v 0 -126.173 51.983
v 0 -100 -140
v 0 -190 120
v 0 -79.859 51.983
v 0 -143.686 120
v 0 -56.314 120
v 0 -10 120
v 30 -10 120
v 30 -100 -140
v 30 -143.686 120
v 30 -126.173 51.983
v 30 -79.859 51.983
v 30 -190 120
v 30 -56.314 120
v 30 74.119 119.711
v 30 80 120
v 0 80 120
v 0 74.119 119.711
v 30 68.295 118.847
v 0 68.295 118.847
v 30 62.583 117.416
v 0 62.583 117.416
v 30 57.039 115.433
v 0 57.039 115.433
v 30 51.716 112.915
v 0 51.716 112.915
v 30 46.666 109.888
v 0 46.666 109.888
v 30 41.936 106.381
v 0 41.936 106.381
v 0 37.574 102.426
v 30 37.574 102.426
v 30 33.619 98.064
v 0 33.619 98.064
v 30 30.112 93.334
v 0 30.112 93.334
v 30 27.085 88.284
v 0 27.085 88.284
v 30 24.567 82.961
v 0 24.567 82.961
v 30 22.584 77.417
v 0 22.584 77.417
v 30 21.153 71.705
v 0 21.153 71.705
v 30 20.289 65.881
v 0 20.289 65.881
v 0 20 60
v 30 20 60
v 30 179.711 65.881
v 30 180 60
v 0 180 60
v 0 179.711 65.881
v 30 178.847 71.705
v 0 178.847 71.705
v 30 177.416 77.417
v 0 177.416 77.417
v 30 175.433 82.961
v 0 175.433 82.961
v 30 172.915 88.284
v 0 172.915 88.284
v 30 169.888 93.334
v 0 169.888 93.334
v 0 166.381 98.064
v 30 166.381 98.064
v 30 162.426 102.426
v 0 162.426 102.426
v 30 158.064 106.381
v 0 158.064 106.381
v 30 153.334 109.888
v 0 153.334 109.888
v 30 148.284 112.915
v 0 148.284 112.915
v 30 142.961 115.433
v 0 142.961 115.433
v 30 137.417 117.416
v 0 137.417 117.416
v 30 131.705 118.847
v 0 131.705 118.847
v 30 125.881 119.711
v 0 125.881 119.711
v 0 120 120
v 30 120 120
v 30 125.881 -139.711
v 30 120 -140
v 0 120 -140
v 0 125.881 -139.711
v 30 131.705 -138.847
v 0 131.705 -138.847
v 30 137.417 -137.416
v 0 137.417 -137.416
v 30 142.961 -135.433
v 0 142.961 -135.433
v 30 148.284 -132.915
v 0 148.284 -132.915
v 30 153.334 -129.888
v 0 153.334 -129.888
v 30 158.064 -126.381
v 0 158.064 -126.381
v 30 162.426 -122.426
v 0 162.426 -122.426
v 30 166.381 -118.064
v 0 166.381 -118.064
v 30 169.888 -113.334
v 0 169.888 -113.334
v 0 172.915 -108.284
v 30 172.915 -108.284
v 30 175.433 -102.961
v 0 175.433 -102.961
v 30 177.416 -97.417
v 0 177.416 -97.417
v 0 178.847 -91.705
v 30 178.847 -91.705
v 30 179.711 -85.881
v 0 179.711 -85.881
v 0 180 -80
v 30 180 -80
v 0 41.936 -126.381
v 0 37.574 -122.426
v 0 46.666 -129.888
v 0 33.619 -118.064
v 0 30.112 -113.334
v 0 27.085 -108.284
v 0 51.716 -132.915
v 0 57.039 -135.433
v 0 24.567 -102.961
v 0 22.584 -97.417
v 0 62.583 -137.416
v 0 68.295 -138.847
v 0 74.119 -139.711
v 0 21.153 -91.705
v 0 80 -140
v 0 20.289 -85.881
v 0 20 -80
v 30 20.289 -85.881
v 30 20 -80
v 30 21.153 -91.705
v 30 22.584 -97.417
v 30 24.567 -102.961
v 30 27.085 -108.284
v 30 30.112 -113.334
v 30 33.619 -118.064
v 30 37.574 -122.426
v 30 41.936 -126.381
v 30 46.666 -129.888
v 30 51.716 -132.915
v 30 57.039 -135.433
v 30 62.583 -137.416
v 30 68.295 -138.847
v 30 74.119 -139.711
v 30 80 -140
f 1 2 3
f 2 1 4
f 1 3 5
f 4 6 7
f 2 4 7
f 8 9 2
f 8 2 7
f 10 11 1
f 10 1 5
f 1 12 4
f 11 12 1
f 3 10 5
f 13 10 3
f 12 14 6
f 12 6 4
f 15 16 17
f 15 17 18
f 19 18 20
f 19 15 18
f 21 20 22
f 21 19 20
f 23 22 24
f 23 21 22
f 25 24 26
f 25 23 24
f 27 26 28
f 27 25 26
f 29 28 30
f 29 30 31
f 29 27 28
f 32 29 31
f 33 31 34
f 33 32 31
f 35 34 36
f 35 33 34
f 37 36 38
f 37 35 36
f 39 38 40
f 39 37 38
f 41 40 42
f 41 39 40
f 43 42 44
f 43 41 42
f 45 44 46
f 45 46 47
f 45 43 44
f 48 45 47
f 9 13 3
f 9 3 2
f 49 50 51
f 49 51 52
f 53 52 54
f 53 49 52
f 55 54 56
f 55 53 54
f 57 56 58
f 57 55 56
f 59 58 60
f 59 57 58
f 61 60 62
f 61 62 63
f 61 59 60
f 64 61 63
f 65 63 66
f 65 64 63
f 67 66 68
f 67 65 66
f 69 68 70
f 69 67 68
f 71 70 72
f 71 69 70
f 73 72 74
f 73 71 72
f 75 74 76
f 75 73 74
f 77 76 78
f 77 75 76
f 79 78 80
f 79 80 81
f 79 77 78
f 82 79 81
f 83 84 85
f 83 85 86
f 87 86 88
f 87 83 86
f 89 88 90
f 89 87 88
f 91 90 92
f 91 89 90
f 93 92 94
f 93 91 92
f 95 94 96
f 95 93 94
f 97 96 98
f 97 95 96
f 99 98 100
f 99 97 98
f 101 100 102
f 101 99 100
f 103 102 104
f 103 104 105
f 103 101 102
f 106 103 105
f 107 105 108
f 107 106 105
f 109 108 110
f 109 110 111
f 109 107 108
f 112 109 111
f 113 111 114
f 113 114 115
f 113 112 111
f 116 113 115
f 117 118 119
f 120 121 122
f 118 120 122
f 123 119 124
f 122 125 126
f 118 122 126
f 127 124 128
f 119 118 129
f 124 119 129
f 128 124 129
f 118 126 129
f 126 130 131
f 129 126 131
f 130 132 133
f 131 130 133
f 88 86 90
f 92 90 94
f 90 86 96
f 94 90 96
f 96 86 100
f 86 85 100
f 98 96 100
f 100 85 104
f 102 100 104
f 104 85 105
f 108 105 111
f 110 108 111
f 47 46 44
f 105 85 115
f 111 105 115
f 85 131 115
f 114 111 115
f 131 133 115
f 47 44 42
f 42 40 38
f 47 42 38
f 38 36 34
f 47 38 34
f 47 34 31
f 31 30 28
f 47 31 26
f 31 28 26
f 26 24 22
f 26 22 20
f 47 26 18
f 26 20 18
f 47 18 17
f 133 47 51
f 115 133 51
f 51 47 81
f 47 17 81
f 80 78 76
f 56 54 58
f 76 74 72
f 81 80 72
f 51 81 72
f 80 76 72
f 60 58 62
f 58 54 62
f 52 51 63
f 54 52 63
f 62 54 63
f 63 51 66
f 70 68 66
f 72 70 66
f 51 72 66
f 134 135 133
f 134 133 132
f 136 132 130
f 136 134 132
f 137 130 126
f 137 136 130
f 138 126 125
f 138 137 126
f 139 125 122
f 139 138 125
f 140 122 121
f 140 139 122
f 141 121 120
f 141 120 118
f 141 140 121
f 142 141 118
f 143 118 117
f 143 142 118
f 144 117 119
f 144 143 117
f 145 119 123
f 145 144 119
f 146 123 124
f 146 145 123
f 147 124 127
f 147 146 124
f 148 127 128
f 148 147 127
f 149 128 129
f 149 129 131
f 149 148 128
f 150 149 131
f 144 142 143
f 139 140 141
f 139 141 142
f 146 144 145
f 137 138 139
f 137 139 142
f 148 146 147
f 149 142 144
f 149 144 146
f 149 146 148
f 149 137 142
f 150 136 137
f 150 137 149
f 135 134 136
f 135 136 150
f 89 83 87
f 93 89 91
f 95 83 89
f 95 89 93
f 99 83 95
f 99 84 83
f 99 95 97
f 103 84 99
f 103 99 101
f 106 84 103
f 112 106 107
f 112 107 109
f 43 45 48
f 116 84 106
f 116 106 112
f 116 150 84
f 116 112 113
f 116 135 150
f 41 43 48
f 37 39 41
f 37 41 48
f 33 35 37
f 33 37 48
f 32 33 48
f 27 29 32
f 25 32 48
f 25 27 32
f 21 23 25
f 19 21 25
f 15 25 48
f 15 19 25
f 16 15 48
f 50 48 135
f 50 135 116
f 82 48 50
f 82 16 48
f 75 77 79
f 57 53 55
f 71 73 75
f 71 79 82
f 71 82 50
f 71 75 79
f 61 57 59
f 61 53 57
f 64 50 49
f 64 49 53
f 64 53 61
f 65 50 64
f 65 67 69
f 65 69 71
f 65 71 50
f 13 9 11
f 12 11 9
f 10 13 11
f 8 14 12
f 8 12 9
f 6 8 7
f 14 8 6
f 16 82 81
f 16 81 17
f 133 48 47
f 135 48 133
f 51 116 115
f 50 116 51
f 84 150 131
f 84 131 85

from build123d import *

# Parameters (mm, degrees)
F2_DEPTH = 30


with BuildPart() as f2:
    # F1 (on offset) → F2 (new body)
    with BuildSketch(Plane.YZ.offset(30)):
        Polygon((-143.685586, 120), (-190, 120), (-100, -140), (-10, 120), (-56.314414, 120), (-79.858788, 51.98292), (-126.173202, 51.98292), align=None)
        with BuildLine():
            Line((120, 120), (80, 120))
            ThreePointArc((80, 120), (37.573593, 102.426407), (20, 60))
            Line((20, 60), (20, -80))
            ThreePointArc((20, -80), (37.573593, -122.426407), (80, -140))
            Line((80, -140), (120, -140))
            ThreePointArc((120, -140), (162.426407, -122.426407), (180, -80))
            Line((180, -80), (180, 60))
            ThreePointArc((180, 60), (162.426407, 102.426407), (120, 120))
        make_face()
    extrude(amount=-F2_DEPTH)


solid = f2.part
